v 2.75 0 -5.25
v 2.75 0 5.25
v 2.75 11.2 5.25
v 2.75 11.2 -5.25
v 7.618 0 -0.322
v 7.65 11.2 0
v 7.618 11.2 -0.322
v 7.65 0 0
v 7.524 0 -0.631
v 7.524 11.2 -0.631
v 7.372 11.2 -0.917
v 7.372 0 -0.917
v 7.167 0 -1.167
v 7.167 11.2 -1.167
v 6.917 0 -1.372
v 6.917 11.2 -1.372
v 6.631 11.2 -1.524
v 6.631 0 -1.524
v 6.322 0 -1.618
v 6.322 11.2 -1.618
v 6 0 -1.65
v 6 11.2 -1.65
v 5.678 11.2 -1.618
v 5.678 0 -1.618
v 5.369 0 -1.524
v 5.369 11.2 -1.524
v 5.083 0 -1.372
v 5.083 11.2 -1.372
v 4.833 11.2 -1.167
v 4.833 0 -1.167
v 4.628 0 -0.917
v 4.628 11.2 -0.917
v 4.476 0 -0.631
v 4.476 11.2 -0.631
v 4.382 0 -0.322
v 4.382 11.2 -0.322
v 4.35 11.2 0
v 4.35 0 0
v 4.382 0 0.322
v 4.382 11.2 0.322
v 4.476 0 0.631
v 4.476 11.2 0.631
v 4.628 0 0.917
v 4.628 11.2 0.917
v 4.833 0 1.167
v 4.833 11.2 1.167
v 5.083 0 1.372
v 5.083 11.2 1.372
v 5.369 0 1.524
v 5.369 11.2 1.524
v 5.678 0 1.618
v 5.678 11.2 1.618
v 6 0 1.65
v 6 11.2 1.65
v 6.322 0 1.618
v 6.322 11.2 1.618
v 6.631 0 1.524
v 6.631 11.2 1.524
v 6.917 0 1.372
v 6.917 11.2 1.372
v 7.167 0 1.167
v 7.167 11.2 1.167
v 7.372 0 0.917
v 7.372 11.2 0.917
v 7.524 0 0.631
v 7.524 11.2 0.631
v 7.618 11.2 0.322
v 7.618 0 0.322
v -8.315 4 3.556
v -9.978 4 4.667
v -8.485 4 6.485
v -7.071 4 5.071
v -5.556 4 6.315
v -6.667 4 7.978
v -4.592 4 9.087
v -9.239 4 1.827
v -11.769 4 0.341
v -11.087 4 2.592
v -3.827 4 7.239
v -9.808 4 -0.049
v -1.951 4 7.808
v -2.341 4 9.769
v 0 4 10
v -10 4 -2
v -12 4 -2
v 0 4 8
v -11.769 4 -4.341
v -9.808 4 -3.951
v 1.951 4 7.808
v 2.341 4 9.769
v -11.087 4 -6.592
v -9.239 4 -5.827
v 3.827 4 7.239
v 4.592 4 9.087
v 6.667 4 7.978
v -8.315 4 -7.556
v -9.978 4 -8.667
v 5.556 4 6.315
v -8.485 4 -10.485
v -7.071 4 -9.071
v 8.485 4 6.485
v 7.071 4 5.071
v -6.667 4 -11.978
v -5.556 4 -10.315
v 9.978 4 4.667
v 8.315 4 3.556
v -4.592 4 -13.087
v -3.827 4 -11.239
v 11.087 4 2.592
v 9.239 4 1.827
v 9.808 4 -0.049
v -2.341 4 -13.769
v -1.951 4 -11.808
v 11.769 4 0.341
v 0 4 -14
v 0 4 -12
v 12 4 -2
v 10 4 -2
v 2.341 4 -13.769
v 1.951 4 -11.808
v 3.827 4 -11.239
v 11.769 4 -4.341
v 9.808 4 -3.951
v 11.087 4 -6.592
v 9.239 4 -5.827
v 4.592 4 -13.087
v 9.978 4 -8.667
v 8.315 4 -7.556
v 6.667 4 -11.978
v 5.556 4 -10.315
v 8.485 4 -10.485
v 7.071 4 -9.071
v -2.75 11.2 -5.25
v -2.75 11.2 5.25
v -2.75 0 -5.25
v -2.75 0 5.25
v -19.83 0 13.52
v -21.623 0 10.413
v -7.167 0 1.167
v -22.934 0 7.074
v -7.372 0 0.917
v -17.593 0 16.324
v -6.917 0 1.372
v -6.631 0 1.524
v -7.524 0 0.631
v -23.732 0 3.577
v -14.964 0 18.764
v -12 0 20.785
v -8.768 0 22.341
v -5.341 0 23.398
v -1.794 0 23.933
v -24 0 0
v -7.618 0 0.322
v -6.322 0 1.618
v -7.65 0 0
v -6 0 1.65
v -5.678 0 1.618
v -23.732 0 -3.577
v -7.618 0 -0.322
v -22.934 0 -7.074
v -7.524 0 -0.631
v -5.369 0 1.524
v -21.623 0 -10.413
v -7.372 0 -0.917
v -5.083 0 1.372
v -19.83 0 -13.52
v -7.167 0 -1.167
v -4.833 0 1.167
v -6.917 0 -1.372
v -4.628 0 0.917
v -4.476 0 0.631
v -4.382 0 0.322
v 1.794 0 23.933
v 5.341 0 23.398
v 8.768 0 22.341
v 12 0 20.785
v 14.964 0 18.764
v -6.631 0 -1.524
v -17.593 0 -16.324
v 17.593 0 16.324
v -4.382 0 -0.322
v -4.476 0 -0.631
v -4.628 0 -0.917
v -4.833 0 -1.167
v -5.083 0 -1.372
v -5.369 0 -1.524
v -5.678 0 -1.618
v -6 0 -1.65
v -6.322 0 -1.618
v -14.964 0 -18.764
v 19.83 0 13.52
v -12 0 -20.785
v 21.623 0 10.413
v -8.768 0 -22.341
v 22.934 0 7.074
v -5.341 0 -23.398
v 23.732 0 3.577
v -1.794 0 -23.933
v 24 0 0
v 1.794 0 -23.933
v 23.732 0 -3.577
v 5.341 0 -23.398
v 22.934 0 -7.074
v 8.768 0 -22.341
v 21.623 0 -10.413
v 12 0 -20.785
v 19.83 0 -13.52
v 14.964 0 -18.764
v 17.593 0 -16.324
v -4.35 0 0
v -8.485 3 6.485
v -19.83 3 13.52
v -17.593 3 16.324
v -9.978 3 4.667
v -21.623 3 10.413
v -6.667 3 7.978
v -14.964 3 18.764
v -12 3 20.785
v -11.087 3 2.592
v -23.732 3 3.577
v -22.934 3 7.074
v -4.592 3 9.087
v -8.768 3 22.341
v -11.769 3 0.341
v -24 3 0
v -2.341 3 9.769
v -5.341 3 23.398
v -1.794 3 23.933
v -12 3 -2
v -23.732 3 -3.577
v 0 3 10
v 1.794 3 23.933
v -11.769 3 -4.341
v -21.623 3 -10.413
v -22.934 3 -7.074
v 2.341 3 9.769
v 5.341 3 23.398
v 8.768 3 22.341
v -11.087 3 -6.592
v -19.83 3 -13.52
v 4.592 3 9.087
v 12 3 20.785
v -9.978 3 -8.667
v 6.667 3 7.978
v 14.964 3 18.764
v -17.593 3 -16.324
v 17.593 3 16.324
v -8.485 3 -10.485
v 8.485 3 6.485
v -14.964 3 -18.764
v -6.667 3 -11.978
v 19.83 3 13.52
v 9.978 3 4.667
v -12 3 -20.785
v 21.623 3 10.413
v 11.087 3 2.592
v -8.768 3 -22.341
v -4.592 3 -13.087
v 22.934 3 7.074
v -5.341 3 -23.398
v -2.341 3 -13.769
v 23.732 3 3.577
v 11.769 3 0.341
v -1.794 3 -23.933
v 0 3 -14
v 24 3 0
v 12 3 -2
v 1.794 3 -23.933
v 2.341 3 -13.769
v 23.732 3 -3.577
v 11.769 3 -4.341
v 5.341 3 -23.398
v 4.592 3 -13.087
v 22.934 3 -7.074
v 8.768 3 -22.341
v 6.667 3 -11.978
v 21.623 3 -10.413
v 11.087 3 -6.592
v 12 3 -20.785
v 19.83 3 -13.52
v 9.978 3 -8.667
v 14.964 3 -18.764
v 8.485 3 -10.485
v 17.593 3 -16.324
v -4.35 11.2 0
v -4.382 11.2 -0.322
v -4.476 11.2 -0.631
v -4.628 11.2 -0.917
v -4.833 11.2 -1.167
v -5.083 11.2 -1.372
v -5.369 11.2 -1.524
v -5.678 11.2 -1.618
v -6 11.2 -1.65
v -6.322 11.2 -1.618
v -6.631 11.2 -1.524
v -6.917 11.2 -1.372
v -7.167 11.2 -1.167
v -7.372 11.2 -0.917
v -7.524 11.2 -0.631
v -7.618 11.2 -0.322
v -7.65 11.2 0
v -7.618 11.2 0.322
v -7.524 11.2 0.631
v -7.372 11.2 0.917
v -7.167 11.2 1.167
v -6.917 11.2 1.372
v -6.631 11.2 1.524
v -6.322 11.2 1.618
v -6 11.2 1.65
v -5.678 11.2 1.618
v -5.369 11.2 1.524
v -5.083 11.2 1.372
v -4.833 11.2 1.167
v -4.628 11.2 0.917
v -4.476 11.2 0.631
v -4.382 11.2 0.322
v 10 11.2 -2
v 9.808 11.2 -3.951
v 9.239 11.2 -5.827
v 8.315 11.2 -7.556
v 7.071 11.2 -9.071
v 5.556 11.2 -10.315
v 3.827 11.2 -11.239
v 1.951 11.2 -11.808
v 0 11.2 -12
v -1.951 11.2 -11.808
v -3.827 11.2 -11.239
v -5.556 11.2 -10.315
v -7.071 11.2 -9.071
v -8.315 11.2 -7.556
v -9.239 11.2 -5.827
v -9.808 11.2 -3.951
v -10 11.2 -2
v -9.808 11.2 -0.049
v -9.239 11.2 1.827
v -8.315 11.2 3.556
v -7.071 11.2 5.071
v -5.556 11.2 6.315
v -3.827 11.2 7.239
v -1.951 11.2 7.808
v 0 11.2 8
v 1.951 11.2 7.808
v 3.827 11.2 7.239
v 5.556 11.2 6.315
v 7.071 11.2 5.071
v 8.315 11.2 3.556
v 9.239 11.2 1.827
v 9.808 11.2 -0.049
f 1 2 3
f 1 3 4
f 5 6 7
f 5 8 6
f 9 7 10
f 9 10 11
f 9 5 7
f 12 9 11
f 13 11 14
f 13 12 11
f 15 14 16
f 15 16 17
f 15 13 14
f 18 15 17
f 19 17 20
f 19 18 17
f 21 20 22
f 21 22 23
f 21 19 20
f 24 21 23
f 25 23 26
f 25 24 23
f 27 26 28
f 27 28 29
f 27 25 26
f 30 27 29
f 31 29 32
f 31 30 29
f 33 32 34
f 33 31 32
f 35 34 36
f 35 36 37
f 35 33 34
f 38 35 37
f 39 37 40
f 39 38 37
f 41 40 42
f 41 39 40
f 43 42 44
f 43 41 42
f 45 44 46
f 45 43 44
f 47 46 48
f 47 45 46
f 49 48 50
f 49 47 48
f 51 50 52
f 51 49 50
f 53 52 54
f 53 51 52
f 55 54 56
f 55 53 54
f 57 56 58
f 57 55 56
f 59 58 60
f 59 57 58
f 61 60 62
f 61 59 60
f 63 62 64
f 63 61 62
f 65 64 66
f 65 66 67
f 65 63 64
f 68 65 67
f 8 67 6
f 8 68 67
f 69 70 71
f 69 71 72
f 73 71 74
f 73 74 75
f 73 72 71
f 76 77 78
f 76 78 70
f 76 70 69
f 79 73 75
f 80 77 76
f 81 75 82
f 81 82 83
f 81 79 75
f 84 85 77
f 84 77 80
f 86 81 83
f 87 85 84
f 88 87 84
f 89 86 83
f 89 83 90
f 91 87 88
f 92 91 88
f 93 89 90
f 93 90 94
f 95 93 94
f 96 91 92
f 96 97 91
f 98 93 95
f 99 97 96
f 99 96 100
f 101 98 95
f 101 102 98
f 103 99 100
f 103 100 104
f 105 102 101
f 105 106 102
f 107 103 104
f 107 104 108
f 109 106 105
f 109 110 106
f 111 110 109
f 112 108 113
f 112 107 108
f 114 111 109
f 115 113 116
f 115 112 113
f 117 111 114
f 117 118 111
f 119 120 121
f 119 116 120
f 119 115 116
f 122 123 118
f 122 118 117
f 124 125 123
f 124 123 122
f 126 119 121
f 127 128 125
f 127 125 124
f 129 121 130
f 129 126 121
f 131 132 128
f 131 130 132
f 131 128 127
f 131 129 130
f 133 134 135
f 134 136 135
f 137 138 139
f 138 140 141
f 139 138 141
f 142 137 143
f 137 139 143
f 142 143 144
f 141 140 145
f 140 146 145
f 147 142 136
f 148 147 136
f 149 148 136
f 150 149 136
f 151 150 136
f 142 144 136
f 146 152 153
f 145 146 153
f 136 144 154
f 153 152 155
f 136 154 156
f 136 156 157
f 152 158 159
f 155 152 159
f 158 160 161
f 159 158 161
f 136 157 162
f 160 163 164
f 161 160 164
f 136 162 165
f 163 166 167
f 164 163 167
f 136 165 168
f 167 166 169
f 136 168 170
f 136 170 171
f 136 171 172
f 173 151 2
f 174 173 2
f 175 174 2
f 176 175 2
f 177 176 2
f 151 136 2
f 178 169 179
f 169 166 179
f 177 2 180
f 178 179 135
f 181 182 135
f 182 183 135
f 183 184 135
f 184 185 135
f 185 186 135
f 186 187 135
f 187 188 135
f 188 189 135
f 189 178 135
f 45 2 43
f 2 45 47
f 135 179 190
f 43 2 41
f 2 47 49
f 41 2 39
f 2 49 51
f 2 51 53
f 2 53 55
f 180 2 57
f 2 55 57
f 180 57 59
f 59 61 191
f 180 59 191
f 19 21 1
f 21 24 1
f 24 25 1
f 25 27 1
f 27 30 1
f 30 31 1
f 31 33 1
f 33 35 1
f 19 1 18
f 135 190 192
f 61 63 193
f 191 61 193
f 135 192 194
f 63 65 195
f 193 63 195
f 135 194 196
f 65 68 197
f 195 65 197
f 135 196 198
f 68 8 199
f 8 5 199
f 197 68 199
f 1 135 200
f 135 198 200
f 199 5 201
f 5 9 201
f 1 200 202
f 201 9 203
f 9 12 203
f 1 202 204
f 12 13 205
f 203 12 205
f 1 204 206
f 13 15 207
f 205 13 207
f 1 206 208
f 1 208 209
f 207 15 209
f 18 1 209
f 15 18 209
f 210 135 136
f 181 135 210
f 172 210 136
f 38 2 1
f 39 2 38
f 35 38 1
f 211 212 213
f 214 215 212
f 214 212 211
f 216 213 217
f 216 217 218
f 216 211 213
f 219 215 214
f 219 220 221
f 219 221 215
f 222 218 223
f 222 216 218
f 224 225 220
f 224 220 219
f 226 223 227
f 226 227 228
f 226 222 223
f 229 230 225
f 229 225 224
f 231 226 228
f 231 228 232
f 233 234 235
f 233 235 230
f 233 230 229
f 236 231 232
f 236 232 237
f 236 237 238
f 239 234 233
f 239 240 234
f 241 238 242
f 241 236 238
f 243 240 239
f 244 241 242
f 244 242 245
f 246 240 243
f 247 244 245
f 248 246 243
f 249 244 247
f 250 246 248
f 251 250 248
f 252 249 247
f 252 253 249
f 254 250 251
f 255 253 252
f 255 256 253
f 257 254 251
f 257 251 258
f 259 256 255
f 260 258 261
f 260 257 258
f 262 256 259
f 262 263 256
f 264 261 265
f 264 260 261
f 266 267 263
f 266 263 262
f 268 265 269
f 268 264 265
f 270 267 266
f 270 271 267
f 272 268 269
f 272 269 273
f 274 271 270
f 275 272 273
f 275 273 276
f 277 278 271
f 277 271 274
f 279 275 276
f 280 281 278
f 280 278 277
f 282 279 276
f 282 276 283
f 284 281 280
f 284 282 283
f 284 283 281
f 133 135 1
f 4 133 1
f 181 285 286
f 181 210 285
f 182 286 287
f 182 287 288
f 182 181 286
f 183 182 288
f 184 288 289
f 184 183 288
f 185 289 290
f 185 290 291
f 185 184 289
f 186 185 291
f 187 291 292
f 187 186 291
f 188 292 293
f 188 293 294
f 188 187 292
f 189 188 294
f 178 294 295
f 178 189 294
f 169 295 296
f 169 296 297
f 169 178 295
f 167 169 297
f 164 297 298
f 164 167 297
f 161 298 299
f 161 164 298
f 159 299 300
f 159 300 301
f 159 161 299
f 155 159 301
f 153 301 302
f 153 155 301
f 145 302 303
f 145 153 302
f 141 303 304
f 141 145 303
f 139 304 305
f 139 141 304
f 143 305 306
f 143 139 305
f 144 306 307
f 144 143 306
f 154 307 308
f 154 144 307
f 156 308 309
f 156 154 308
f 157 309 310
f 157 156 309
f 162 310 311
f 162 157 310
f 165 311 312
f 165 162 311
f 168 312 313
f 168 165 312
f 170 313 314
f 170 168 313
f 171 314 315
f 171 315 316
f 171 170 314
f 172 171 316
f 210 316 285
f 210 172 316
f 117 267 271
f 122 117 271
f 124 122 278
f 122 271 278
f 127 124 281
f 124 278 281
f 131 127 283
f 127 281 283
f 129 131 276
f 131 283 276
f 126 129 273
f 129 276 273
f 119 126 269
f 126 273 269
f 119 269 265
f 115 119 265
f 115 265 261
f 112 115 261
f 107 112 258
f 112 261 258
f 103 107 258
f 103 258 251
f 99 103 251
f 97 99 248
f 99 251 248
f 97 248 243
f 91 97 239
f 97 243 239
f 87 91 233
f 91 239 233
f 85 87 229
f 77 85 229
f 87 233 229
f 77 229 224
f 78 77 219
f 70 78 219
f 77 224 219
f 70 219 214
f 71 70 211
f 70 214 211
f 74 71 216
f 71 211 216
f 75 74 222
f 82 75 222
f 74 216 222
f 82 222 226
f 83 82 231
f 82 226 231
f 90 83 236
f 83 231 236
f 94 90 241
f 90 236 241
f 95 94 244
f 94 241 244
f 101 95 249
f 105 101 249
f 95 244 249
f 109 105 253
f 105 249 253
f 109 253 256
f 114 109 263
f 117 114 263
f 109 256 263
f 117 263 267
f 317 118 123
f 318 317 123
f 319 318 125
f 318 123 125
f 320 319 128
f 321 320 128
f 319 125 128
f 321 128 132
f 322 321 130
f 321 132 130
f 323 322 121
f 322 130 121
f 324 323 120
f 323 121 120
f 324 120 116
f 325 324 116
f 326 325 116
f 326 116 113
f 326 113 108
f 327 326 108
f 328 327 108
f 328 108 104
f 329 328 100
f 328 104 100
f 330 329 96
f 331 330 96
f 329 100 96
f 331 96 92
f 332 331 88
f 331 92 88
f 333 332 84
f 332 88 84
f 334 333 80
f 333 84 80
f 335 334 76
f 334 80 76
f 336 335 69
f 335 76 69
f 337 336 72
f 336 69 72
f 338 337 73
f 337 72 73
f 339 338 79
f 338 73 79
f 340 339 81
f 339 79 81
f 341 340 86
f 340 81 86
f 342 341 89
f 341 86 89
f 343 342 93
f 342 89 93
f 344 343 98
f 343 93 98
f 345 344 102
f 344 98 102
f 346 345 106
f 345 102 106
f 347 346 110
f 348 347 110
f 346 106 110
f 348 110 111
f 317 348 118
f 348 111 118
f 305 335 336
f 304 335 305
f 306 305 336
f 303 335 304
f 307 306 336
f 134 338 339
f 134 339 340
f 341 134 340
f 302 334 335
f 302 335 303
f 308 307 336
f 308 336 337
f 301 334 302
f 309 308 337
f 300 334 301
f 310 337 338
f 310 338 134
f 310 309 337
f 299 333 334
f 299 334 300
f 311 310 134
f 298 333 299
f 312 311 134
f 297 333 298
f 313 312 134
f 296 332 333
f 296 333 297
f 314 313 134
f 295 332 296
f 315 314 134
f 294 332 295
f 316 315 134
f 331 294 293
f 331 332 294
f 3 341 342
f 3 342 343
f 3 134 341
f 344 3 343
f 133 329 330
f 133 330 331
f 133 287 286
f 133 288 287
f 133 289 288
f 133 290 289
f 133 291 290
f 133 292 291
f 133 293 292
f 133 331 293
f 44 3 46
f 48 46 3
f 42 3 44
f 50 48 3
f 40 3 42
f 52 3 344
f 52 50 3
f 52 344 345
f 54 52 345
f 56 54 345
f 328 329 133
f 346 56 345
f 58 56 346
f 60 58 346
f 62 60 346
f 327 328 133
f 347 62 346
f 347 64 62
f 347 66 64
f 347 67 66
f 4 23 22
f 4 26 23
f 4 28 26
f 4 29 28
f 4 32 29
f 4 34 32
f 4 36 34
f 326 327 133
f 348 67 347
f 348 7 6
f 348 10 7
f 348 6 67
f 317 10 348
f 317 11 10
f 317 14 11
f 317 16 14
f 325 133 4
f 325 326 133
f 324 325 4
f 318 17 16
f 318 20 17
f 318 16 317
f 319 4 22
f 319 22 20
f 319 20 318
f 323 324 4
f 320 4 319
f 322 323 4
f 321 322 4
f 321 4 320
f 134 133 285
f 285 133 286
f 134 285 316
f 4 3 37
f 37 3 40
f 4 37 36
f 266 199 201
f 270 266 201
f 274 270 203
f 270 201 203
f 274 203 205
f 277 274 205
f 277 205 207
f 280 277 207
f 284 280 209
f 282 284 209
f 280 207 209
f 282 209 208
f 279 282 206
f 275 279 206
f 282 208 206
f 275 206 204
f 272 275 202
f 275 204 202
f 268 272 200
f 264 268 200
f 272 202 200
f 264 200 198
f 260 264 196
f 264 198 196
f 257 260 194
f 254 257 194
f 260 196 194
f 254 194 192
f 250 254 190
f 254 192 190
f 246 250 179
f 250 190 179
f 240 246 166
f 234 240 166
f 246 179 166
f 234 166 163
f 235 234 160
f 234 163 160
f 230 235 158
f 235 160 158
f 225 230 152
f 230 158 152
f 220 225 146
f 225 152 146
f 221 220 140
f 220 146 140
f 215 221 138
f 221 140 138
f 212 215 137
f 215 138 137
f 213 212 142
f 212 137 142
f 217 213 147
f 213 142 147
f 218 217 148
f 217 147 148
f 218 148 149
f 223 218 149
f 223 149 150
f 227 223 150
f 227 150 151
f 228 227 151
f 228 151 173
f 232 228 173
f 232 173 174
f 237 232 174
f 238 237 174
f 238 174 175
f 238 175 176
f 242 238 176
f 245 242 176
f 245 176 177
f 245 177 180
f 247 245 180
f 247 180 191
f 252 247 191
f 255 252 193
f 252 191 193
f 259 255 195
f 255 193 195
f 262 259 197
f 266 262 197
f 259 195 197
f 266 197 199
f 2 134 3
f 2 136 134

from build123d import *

# Parameters (mm, degrees)
SKETCH1_R           = 24
SKETCH1_R_2         = 1.65
SKETCH1_W           = 5.5
SKETCH1_H           = 10.5
BOSS_EXTRUDE1_DEPTH = 3
SKETCH2_R           = 12
SKETCH2_R_2         = 1.65
SKETCH2_W           = 5.5
SKETCH2_H           = 10.5
BOSS_EXTRUDE2_DEPTH = 1
SKETCH4_R           = 10
SKETCH4_R_2         = 1.65
SKETCH4_W           = 5.5
SKETCH4_H           = 10.5
BOSS_EXTRUDE3_DEPTH = 7.2


with BuildPart() as part:
    # Sketch1 → Boss-Extrude1 (new body)
    with BuildSketch(Plane(origin=(0, 0, 0), x_dir=(1, 0, 0), z_dir=(0, 1, 0))):
        Circle(SKETCH1_R)
        with Locations((-6, 0)):
            Circle(SKETCH1_R_2, mode=Mode.SUBTRACT)
        with Locations((6, 0)):
            Circle(SKETCH1_R_2, mode=Mode.SUBTRACT)
        Rectangle(SKETCH1_W, SKETCH1_H, mode=Mode.SUBTRACT)
    extrude(amount=BOSS_EXTRUDE1_DEPTH)

    # Sketch2 → Boss-Extrude2 (add)
    with BuildSketch(Plane(origin=(0, 3, 0), x_dir=(1, 0, 0), z_dir=(0, 1, 0))):
        with Locations((0, 2)):
            Circle(SKETCH2_R)
        with Locations((-6, 0)):
            Circle(SKETCH2_R_2, mode=Mode.SUBTRACT)
        with Locations((6, 0)):
            Circle(SKETCH2_R_2, mode=Mode.SUBTRACT)
        Rectangle(SKETCH2_W, SKETCH2_H, mode=Mode.SUBTRACT)
    extrude(amount=BOSS_EXTRUDE2_DEPTH)

    # Sketch4 → Boss-Extrude3 (add)
    with BuildSketch(Plane(origin=(0, 4, 0), x_dir=(1, 0, 0), z_dir=(0, 1, 0))):
        with Locations((0, 2)):
            Circle(SKETCH4_R)
        with Locations((-6, 0)):
            Circle(SKETCH4_R_2, mode=Mode.SUBTRACT)
        with Locations((6, 0)):
            Circle(SKETCH4_R_2, mode=Mode.SUBTRACT)
        Rectangle(SKETCH4_W, SKETCH4_H, mode=Mode.SUBTRACT)
    extrude(amount=BOSS_EXTRUDE3_DEPTH)


solid = part.part
